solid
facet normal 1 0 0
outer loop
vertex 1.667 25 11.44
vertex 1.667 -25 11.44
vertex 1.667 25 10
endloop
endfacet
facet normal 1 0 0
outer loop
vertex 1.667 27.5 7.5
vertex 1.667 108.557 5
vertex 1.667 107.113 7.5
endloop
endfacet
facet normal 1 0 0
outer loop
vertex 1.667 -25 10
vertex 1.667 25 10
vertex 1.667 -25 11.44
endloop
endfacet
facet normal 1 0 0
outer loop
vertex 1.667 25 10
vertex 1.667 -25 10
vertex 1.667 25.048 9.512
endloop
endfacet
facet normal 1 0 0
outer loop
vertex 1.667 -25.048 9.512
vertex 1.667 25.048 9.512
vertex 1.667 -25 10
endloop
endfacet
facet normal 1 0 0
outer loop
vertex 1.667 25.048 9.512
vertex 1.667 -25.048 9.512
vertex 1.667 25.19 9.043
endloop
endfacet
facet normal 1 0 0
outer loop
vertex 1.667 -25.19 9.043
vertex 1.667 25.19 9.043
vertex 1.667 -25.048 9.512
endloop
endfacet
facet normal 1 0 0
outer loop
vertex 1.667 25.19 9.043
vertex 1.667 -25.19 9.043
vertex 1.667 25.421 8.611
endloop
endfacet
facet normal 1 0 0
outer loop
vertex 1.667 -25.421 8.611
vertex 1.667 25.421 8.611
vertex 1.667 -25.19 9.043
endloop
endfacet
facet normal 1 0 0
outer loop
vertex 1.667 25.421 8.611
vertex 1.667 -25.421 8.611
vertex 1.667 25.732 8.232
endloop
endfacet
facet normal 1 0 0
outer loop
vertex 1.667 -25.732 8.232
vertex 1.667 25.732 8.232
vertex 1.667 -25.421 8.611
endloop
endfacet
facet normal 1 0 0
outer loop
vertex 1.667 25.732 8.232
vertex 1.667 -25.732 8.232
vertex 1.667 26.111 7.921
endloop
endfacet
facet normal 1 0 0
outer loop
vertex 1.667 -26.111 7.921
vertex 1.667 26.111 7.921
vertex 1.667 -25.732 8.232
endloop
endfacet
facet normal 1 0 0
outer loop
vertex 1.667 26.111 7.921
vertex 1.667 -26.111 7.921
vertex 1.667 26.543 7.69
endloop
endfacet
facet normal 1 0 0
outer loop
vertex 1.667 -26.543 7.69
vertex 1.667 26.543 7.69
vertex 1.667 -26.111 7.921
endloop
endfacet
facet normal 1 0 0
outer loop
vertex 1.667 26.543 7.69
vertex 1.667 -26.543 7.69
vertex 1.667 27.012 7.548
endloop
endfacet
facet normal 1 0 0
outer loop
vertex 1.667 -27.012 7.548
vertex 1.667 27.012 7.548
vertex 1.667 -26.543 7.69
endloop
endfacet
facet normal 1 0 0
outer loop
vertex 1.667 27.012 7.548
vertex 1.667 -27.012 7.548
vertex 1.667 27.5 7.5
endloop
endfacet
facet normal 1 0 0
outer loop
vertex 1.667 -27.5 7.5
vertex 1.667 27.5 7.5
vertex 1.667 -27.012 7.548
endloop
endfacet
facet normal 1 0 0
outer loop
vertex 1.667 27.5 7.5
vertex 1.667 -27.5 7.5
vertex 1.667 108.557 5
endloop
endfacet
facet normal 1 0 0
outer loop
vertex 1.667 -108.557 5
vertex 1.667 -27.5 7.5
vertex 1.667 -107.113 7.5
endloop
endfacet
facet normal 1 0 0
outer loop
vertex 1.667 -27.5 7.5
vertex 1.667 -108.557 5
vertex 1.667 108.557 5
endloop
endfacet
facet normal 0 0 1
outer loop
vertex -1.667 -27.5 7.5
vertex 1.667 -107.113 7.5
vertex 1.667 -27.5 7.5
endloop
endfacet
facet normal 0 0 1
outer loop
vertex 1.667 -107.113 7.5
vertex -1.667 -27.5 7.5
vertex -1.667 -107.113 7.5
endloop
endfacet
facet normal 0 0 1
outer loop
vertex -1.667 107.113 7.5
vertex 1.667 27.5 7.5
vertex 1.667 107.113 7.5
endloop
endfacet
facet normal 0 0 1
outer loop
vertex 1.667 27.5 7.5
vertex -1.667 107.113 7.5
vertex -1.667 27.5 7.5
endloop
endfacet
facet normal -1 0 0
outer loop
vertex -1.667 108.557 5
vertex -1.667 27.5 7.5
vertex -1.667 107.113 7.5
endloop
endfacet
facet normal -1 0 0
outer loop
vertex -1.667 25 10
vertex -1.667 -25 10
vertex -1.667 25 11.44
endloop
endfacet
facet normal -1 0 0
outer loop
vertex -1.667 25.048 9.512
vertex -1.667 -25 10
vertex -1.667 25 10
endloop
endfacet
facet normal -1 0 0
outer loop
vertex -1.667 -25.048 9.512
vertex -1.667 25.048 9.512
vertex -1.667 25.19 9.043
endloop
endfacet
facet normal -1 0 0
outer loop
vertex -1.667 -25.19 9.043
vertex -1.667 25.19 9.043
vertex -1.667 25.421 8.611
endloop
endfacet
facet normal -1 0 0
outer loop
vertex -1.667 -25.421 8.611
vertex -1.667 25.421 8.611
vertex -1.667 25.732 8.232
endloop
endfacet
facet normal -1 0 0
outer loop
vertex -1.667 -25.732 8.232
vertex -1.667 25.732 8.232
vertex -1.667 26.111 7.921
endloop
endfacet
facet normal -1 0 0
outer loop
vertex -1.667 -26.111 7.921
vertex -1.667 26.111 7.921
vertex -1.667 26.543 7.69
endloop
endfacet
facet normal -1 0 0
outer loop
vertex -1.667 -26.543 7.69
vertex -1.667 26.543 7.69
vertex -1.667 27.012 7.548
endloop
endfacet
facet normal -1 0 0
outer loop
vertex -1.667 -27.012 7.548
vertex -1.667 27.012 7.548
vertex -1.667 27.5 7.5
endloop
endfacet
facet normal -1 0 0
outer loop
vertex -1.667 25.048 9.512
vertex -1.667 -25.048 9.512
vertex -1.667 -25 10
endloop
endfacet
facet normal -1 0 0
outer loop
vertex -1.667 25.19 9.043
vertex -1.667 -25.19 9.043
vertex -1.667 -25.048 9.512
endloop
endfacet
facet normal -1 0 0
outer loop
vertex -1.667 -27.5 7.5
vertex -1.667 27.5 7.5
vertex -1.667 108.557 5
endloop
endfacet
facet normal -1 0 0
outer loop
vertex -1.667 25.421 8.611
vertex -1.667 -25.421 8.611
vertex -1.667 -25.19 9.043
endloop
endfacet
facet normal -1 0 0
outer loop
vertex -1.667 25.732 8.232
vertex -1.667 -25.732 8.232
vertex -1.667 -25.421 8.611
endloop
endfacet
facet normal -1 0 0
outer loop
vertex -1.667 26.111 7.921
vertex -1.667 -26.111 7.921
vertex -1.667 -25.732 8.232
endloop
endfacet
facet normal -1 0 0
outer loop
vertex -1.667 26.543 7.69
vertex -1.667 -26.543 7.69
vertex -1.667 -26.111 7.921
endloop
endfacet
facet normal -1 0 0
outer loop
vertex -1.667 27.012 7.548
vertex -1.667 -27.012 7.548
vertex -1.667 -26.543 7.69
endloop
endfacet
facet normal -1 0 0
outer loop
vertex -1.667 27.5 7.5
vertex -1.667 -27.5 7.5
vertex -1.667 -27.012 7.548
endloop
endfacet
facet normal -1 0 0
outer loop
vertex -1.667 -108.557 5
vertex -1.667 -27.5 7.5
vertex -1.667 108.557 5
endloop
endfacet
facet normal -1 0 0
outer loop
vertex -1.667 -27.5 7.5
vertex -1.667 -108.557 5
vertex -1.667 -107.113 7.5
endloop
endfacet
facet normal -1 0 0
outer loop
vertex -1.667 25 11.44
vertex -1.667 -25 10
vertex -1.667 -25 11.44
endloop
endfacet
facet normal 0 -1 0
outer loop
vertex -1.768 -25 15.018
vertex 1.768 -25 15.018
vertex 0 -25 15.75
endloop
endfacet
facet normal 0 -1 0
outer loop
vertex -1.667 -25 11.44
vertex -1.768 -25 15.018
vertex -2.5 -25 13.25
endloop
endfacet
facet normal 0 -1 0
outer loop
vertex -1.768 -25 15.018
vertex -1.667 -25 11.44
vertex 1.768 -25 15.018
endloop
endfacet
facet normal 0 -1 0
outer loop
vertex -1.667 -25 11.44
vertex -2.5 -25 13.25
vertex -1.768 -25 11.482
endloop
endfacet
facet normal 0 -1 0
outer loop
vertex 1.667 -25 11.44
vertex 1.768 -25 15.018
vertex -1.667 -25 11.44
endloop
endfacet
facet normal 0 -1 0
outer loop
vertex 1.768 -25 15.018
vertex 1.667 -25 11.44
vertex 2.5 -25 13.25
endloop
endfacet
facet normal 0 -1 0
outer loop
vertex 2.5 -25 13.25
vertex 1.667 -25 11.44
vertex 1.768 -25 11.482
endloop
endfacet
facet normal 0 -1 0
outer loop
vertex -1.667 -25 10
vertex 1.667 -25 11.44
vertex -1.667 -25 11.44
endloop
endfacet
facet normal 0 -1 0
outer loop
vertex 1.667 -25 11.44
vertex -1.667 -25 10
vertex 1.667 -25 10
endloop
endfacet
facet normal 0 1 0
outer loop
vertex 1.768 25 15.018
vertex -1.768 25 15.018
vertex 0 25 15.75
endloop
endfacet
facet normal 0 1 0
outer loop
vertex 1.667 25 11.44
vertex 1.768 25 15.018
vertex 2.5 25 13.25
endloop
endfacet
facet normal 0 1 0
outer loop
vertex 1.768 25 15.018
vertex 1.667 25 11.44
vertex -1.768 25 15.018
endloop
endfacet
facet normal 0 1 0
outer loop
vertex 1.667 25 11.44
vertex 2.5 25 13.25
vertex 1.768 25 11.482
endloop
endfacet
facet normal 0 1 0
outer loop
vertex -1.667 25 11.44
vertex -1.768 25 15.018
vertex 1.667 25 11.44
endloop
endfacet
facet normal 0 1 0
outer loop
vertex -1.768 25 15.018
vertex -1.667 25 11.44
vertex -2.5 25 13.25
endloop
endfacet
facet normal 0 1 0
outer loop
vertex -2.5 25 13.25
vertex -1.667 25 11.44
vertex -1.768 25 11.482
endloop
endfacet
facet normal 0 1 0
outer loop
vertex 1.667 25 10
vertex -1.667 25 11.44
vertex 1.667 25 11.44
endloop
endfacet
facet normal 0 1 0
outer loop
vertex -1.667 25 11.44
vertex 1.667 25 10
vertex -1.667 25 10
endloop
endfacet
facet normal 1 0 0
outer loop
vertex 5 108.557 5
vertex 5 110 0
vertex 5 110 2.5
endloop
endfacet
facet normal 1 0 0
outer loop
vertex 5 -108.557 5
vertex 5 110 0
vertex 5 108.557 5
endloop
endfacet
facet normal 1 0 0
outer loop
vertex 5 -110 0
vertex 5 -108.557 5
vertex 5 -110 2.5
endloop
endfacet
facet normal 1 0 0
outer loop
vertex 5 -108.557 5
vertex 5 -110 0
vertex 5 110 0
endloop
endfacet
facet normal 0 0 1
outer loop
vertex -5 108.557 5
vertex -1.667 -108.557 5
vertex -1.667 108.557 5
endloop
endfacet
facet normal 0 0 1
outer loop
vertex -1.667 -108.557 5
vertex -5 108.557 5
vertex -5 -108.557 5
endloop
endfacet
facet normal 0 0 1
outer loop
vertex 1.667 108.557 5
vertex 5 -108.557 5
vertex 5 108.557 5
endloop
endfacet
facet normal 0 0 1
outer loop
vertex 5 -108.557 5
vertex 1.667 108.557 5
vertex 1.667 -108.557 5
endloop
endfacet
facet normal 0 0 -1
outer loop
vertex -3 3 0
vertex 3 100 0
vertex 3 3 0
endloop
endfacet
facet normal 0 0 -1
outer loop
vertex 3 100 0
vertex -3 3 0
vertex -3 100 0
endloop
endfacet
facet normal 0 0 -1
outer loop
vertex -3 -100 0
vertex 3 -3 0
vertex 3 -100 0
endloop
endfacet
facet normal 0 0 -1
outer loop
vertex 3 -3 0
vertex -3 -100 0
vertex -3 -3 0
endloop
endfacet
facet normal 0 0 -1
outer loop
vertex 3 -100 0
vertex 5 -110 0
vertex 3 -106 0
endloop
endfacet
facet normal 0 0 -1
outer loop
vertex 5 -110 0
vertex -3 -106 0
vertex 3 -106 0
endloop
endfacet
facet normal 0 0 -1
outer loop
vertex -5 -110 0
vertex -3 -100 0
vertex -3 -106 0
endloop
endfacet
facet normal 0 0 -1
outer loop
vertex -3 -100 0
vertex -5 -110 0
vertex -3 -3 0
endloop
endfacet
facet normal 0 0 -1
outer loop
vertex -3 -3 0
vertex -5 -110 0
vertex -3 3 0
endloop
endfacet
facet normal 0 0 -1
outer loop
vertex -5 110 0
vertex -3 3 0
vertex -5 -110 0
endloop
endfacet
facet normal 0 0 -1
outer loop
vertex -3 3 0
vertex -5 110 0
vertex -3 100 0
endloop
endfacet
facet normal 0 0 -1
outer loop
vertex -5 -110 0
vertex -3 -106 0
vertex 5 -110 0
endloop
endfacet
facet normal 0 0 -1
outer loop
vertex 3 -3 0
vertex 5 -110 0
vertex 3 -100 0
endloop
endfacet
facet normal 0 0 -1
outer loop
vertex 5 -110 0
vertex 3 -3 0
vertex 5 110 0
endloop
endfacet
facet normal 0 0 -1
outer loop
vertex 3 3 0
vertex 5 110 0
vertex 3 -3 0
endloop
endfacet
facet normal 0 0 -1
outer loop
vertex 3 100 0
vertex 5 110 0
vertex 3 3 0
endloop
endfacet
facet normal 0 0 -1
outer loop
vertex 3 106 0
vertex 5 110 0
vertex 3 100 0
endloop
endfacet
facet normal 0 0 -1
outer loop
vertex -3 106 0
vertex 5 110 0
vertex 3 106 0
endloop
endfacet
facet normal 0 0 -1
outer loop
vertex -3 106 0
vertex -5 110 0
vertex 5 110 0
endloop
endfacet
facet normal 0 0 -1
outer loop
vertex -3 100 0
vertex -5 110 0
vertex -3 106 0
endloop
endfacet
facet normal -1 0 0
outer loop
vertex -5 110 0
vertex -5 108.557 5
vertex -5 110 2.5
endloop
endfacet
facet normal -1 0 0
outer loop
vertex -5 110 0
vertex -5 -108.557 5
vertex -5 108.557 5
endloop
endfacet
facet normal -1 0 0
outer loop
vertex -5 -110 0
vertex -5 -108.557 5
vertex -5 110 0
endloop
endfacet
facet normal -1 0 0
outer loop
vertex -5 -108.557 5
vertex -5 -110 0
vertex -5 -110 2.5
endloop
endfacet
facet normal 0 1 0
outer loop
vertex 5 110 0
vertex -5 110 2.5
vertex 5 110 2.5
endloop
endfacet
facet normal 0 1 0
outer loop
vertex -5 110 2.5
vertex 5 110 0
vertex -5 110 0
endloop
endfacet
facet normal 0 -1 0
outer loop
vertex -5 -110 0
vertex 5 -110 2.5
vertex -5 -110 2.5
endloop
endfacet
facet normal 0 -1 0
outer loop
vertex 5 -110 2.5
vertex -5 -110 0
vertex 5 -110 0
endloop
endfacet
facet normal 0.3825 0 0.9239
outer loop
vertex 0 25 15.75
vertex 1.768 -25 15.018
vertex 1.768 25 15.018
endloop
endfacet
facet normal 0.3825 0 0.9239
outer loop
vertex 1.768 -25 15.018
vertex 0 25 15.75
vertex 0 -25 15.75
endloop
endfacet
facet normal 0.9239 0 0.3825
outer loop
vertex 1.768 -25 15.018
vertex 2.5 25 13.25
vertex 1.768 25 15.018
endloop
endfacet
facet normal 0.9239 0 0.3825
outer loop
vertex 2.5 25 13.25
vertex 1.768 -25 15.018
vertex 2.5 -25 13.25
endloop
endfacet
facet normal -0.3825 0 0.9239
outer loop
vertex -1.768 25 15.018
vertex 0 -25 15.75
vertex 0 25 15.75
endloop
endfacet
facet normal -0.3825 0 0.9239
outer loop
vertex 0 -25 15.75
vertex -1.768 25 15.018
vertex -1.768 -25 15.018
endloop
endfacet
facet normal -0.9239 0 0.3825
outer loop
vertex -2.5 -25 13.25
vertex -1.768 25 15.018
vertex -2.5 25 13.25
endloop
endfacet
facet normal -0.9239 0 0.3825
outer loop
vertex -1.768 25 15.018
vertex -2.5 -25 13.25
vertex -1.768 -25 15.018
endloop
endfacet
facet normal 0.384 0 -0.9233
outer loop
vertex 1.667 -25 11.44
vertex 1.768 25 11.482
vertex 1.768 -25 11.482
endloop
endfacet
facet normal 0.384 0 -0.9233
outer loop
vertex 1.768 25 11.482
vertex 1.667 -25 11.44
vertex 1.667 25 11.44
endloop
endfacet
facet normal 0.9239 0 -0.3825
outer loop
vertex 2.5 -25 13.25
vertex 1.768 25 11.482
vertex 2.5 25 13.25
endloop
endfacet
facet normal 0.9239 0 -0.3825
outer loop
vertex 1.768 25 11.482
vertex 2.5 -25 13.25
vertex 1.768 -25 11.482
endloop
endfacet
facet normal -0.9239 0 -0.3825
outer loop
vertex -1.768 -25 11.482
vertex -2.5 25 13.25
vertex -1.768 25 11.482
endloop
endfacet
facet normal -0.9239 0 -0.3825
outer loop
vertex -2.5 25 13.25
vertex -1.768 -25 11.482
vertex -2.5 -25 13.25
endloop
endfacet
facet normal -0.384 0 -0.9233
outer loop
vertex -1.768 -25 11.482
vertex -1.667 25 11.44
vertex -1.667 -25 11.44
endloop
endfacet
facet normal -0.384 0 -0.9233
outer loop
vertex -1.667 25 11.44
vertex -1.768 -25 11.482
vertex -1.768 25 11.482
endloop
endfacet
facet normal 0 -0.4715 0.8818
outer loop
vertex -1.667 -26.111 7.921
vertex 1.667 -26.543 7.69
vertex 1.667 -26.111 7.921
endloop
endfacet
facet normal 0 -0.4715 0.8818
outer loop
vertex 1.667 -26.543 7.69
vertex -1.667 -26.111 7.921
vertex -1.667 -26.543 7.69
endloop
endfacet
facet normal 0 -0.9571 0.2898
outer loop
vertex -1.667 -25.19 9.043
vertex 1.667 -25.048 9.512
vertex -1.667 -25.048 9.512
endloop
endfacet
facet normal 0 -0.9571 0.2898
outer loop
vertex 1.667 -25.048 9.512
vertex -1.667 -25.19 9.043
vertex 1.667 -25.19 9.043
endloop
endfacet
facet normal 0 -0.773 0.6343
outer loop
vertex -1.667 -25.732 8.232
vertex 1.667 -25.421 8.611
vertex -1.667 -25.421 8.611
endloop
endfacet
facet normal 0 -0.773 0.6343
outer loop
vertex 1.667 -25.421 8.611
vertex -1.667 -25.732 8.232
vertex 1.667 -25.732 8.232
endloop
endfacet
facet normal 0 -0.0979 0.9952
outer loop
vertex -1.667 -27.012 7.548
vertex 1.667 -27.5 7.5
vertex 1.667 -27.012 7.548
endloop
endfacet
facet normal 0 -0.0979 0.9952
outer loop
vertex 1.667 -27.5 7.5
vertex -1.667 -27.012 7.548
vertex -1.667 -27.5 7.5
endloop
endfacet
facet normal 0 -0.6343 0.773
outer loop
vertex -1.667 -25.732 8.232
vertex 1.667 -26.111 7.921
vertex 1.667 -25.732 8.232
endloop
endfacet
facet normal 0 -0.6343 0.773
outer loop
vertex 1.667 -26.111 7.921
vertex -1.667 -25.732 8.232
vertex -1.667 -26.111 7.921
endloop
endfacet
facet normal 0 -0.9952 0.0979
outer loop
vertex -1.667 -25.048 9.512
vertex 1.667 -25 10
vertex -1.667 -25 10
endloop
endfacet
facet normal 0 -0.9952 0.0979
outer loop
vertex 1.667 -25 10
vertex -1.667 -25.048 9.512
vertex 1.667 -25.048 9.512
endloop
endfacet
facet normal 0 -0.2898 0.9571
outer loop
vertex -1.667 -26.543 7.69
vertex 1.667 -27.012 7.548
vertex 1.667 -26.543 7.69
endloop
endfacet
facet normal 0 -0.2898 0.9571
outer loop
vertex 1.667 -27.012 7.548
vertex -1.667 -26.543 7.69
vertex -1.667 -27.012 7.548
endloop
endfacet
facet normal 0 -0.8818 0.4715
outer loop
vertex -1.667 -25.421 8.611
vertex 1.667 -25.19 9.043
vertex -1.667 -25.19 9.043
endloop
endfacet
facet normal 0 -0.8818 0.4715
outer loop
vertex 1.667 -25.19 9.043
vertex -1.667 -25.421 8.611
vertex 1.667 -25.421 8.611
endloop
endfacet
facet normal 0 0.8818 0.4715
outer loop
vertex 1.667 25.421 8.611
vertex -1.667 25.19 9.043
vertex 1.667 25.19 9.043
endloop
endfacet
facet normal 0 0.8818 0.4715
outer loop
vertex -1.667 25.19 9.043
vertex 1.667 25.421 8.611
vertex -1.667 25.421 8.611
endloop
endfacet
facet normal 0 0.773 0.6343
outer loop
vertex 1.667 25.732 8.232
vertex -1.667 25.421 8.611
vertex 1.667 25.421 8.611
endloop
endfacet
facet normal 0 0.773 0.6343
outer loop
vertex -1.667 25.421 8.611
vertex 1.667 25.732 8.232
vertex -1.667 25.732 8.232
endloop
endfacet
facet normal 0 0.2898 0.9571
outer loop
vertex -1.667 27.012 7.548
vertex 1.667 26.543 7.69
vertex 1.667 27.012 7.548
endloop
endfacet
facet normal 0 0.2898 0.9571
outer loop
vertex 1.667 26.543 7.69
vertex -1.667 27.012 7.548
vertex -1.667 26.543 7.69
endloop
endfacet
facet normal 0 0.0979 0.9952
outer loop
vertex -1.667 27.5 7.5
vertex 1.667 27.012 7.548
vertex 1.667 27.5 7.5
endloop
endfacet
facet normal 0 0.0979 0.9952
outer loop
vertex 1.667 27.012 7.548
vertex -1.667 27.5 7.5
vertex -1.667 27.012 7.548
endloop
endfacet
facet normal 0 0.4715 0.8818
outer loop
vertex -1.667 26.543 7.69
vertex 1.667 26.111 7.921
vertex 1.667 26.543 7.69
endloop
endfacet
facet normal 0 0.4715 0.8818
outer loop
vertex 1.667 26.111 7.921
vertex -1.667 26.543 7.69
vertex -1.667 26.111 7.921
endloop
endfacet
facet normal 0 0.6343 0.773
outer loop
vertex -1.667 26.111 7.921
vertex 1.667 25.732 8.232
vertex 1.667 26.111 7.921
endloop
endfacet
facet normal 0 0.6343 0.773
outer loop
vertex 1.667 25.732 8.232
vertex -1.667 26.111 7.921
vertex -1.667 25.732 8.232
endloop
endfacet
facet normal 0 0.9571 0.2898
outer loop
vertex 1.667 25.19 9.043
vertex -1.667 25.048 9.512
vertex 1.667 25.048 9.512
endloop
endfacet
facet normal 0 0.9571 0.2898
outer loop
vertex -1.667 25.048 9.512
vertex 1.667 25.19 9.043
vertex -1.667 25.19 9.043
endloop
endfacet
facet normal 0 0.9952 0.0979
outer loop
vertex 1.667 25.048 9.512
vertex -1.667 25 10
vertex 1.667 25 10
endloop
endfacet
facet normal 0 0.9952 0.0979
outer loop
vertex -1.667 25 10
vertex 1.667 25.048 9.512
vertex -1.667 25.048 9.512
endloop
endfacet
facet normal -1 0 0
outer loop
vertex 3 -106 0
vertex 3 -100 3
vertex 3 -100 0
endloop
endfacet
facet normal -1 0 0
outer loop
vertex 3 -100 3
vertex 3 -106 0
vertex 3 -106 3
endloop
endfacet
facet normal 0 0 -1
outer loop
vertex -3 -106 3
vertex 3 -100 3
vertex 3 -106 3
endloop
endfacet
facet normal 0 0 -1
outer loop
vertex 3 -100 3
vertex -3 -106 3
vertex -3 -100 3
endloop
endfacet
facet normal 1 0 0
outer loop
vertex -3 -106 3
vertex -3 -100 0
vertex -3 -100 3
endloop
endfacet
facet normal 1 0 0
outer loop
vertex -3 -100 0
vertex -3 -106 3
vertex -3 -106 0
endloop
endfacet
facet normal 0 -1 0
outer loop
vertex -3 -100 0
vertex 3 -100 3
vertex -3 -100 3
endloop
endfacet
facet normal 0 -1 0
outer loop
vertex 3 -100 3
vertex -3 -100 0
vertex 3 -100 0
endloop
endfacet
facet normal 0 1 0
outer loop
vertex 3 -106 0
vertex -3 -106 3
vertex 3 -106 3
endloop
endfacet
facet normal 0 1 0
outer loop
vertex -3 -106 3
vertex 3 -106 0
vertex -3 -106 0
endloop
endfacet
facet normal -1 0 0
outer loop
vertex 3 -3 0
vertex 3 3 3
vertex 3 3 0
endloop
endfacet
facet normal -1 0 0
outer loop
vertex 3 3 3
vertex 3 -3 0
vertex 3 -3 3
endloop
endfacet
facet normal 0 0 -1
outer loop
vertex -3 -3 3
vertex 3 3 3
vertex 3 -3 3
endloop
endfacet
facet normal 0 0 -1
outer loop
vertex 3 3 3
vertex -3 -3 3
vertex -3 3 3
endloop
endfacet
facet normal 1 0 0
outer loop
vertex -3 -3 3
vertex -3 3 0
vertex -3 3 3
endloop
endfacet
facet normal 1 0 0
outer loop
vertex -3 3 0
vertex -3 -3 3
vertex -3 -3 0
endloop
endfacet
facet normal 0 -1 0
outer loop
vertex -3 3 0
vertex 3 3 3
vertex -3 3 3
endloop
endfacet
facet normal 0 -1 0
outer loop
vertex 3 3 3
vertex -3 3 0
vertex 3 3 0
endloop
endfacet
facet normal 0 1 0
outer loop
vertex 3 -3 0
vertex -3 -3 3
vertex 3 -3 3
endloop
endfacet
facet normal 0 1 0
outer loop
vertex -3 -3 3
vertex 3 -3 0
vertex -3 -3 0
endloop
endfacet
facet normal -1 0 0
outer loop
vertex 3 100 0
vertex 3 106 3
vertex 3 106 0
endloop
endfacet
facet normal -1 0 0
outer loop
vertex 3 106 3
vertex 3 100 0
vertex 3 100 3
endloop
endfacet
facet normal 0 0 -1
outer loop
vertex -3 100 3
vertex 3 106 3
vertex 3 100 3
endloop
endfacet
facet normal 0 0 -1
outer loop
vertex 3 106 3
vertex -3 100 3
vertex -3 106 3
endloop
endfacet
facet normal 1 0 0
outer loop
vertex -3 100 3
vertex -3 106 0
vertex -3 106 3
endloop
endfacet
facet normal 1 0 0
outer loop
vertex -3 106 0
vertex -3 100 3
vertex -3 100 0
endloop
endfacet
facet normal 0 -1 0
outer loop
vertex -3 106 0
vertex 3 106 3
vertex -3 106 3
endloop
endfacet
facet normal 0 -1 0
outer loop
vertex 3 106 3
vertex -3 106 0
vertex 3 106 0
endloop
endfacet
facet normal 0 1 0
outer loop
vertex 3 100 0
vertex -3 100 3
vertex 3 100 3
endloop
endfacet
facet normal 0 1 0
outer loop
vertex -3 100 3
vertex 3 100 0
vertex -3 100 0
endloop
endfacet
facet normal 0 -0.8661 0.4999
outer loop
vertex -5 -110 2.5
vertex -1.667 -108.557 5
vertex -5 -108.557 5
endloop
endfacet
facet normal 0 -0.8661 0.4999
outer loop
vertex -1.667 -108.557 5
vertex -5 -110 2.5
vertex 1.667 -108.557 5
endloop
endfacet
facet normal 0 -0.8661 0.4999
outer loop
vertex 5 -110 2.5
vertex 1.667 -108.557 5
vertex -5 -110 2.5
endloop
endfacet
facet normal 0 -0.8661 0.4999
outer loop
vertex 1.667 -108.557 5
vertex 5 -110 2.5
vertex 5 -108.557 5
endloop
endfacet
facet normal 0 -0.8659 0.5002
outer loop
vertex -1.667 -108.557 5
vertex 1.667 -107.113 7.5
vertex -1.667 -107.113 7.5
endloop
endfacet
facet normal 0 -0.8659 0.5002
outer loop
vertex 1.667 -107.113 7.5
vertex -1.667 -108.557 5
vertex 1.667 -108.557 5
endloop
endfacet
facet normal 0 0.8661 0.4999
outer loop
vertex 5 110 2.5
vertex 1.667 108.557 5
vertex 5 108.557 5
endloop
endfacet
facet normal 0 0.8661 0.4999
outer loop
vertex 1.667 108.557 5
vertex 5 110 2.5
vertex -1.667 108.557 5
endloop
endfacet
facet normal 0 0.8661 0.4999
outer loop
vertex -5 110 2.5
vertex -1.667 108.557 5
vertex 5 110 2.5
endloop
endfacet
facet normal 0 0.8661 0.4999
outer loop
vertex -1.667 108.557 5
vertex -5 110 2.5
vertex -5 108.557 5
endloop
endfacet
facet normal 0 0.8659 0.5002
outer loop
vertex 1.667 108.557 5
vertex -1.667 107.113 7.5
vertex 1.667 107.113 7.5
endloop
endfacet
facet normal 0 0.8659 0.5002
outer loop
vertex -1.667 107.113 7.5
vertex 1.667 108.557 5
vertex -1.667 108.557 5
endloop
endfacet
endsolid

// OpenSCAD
//CUSTOMIZER VARIABLES

/* [Basic_Parameters] */

// number of magnets across the bar
magnet_count = 3;   // [2:20]

// magnet shape
magnet_square = 1;    // [0:circular, 1:square]

// magnet diameter, in mm
magnet_diameter = 6.0;    // [1.0:0.1:20.0]

// height of magnets, in mm
magnet_height = 3.0;    // [1.0:0.1:20.0]

// length of the bar, in mm
bar_length = 220;   // [50:500]

// bar height, in mm
bar_height = 5.0;   // [2:50]

// magnet distance from end of bar, in mm
end_offset = 7;  // [5:30]

// finger grip height, in mm
grip_height = 10;   // [10:50]

// finger grip length, in mm
grip_length = 50;    // [20:100]

// finger grip top width (can be zero), in mm
grip_top_width = 5.0;   // [0:10]

// width margin around magnets, in mm
magnet_margin = 2.0;    // [1:20]


//CUSTOMIZER VARIABLES END


// Sanity checks
if ( ((magnet_count * magnet_diameter) + end_offset) > bar_length )
{
    echo("<B>Error: bar length too small for magnets </B>");
}

if ( grip_length > bar_length )
{
    echo("<B>Error: bar length too small for finger grip </B>");
}



// our object, flat on xy plane for easy STL generation
paper_holder();


module paper_holder() {
    
    bar_width = magnet_diameter + 2*magnet_margin;
    real_bar_height = max( bar_height, magnet_height + magnet_margin );
    stength_width = bar_width / 3;
    strength_height = min( real_bar_height/2, grip_height );
    magnet_radius = magnet_diameter / 2;
    real_end_offset = max( end_offset, magnet_margin );
    grip_radius = max( grip_top_width, stength_width ) / 2;
    
    difference() {
        
        union () {
            
            // main body
            translate( [0,0, real_bar_height/2 ] )
                cube([bar_width,bar_length,real_bar_height], center=true );
            
            // strength bar across top
            translate( [0,0, real_bar_height + strength_height/2 ] )
                cube([stength_width,bar_length,strength_height], center=true );
            
            // finger grip in center
            translate( [0,0, grip_height/2 + real_bar_height ] )
                cube([stength_width,grip_length,grip_height], center=true );
            
            // finger grip top
            translate( [0,0, grip_height + real_bar_height - 0.7 * grip_radius] )
              rotate([90,0,0])
                cylinder(grip_length, grip_radius, grip_radius, center=true, $fn=8 );
            
            // finger grip fillet
           if (strength_height < grip_height) {
             translate( [0,-grip_length/2-grip_height/8, real_bar_height + strength_height + grip_height/8 ] )
                cube([stength_width,grip_height/4,grip_height/4], center=true );
             translate( [0,grip_length/2+grip_height/8, real_bar_height + strength_height + grip_height/8 ] )
                cube([stength_width,grip_height/4,grip_height/4], center=true );
           }
            
        }   // end union
    
        
    // trim sharp corners on ends
    translate([0,-bar_length/2,real_bar_height + strength_height])
      rotate([60,0,0])
        cube([bar_width+2,real_bar_height*2,real_bar_height], center=true );
    translate([0,bar_length/2,real_bar_height + strength_height])
      rotate([-60,0,0])
        cube([bar_width+2,real_bar_height*2,real_bar_height], center=true );
    
    
    // fillet finger grip
    if (strength_height < grip_height) {
      translate( [0,-grip_length/2 - grip_height/4, real_bar_height + strength_height + grip_height/4 ] )
        rotate([0,90,0])
          cylinder(stength_width+4,grip_height/4,grip_height/4, center=true, $fn=32 );
      translate( [0,grip_length/2 + grip_height/4, real_bar_height + strength_height + grip_height/4 ] )
        rotate([0,90,0])
          cylinder(stength_width+4,grip_height/4,grip_height/4, center=true, $fn=32 );
    }
    
        
    // magnet holes
    magnet_start = -bar_length/2 + real_end_offset;
    magnet_end = bar_length/2 - real_end_offset;
    magnet_spacing = (magnet_end - magnet_start) / (magnet_count-1);
    vis_offset = 2;
    
    for (k = [ 0 : 1 : (magnet_count-1) ]) {
        center = k * magnet_spacing + magnet_start;
        if (magnet_square) {
          translate([0,center,magnet_height/2 - vis_offset/2])
            cube([magnet_diameter,magnet_diameter,magnet_height+vis_offset], center=true );
        } else {
          translate([0,center,magnet_height/2 - vis_offset/2])
            cylinder(magnet_height+vis_offset,magnet_radius,magnet_radius, center=true );
        }
      } // end for k
    
    }   // end difference
    
}   // end paper_holder
